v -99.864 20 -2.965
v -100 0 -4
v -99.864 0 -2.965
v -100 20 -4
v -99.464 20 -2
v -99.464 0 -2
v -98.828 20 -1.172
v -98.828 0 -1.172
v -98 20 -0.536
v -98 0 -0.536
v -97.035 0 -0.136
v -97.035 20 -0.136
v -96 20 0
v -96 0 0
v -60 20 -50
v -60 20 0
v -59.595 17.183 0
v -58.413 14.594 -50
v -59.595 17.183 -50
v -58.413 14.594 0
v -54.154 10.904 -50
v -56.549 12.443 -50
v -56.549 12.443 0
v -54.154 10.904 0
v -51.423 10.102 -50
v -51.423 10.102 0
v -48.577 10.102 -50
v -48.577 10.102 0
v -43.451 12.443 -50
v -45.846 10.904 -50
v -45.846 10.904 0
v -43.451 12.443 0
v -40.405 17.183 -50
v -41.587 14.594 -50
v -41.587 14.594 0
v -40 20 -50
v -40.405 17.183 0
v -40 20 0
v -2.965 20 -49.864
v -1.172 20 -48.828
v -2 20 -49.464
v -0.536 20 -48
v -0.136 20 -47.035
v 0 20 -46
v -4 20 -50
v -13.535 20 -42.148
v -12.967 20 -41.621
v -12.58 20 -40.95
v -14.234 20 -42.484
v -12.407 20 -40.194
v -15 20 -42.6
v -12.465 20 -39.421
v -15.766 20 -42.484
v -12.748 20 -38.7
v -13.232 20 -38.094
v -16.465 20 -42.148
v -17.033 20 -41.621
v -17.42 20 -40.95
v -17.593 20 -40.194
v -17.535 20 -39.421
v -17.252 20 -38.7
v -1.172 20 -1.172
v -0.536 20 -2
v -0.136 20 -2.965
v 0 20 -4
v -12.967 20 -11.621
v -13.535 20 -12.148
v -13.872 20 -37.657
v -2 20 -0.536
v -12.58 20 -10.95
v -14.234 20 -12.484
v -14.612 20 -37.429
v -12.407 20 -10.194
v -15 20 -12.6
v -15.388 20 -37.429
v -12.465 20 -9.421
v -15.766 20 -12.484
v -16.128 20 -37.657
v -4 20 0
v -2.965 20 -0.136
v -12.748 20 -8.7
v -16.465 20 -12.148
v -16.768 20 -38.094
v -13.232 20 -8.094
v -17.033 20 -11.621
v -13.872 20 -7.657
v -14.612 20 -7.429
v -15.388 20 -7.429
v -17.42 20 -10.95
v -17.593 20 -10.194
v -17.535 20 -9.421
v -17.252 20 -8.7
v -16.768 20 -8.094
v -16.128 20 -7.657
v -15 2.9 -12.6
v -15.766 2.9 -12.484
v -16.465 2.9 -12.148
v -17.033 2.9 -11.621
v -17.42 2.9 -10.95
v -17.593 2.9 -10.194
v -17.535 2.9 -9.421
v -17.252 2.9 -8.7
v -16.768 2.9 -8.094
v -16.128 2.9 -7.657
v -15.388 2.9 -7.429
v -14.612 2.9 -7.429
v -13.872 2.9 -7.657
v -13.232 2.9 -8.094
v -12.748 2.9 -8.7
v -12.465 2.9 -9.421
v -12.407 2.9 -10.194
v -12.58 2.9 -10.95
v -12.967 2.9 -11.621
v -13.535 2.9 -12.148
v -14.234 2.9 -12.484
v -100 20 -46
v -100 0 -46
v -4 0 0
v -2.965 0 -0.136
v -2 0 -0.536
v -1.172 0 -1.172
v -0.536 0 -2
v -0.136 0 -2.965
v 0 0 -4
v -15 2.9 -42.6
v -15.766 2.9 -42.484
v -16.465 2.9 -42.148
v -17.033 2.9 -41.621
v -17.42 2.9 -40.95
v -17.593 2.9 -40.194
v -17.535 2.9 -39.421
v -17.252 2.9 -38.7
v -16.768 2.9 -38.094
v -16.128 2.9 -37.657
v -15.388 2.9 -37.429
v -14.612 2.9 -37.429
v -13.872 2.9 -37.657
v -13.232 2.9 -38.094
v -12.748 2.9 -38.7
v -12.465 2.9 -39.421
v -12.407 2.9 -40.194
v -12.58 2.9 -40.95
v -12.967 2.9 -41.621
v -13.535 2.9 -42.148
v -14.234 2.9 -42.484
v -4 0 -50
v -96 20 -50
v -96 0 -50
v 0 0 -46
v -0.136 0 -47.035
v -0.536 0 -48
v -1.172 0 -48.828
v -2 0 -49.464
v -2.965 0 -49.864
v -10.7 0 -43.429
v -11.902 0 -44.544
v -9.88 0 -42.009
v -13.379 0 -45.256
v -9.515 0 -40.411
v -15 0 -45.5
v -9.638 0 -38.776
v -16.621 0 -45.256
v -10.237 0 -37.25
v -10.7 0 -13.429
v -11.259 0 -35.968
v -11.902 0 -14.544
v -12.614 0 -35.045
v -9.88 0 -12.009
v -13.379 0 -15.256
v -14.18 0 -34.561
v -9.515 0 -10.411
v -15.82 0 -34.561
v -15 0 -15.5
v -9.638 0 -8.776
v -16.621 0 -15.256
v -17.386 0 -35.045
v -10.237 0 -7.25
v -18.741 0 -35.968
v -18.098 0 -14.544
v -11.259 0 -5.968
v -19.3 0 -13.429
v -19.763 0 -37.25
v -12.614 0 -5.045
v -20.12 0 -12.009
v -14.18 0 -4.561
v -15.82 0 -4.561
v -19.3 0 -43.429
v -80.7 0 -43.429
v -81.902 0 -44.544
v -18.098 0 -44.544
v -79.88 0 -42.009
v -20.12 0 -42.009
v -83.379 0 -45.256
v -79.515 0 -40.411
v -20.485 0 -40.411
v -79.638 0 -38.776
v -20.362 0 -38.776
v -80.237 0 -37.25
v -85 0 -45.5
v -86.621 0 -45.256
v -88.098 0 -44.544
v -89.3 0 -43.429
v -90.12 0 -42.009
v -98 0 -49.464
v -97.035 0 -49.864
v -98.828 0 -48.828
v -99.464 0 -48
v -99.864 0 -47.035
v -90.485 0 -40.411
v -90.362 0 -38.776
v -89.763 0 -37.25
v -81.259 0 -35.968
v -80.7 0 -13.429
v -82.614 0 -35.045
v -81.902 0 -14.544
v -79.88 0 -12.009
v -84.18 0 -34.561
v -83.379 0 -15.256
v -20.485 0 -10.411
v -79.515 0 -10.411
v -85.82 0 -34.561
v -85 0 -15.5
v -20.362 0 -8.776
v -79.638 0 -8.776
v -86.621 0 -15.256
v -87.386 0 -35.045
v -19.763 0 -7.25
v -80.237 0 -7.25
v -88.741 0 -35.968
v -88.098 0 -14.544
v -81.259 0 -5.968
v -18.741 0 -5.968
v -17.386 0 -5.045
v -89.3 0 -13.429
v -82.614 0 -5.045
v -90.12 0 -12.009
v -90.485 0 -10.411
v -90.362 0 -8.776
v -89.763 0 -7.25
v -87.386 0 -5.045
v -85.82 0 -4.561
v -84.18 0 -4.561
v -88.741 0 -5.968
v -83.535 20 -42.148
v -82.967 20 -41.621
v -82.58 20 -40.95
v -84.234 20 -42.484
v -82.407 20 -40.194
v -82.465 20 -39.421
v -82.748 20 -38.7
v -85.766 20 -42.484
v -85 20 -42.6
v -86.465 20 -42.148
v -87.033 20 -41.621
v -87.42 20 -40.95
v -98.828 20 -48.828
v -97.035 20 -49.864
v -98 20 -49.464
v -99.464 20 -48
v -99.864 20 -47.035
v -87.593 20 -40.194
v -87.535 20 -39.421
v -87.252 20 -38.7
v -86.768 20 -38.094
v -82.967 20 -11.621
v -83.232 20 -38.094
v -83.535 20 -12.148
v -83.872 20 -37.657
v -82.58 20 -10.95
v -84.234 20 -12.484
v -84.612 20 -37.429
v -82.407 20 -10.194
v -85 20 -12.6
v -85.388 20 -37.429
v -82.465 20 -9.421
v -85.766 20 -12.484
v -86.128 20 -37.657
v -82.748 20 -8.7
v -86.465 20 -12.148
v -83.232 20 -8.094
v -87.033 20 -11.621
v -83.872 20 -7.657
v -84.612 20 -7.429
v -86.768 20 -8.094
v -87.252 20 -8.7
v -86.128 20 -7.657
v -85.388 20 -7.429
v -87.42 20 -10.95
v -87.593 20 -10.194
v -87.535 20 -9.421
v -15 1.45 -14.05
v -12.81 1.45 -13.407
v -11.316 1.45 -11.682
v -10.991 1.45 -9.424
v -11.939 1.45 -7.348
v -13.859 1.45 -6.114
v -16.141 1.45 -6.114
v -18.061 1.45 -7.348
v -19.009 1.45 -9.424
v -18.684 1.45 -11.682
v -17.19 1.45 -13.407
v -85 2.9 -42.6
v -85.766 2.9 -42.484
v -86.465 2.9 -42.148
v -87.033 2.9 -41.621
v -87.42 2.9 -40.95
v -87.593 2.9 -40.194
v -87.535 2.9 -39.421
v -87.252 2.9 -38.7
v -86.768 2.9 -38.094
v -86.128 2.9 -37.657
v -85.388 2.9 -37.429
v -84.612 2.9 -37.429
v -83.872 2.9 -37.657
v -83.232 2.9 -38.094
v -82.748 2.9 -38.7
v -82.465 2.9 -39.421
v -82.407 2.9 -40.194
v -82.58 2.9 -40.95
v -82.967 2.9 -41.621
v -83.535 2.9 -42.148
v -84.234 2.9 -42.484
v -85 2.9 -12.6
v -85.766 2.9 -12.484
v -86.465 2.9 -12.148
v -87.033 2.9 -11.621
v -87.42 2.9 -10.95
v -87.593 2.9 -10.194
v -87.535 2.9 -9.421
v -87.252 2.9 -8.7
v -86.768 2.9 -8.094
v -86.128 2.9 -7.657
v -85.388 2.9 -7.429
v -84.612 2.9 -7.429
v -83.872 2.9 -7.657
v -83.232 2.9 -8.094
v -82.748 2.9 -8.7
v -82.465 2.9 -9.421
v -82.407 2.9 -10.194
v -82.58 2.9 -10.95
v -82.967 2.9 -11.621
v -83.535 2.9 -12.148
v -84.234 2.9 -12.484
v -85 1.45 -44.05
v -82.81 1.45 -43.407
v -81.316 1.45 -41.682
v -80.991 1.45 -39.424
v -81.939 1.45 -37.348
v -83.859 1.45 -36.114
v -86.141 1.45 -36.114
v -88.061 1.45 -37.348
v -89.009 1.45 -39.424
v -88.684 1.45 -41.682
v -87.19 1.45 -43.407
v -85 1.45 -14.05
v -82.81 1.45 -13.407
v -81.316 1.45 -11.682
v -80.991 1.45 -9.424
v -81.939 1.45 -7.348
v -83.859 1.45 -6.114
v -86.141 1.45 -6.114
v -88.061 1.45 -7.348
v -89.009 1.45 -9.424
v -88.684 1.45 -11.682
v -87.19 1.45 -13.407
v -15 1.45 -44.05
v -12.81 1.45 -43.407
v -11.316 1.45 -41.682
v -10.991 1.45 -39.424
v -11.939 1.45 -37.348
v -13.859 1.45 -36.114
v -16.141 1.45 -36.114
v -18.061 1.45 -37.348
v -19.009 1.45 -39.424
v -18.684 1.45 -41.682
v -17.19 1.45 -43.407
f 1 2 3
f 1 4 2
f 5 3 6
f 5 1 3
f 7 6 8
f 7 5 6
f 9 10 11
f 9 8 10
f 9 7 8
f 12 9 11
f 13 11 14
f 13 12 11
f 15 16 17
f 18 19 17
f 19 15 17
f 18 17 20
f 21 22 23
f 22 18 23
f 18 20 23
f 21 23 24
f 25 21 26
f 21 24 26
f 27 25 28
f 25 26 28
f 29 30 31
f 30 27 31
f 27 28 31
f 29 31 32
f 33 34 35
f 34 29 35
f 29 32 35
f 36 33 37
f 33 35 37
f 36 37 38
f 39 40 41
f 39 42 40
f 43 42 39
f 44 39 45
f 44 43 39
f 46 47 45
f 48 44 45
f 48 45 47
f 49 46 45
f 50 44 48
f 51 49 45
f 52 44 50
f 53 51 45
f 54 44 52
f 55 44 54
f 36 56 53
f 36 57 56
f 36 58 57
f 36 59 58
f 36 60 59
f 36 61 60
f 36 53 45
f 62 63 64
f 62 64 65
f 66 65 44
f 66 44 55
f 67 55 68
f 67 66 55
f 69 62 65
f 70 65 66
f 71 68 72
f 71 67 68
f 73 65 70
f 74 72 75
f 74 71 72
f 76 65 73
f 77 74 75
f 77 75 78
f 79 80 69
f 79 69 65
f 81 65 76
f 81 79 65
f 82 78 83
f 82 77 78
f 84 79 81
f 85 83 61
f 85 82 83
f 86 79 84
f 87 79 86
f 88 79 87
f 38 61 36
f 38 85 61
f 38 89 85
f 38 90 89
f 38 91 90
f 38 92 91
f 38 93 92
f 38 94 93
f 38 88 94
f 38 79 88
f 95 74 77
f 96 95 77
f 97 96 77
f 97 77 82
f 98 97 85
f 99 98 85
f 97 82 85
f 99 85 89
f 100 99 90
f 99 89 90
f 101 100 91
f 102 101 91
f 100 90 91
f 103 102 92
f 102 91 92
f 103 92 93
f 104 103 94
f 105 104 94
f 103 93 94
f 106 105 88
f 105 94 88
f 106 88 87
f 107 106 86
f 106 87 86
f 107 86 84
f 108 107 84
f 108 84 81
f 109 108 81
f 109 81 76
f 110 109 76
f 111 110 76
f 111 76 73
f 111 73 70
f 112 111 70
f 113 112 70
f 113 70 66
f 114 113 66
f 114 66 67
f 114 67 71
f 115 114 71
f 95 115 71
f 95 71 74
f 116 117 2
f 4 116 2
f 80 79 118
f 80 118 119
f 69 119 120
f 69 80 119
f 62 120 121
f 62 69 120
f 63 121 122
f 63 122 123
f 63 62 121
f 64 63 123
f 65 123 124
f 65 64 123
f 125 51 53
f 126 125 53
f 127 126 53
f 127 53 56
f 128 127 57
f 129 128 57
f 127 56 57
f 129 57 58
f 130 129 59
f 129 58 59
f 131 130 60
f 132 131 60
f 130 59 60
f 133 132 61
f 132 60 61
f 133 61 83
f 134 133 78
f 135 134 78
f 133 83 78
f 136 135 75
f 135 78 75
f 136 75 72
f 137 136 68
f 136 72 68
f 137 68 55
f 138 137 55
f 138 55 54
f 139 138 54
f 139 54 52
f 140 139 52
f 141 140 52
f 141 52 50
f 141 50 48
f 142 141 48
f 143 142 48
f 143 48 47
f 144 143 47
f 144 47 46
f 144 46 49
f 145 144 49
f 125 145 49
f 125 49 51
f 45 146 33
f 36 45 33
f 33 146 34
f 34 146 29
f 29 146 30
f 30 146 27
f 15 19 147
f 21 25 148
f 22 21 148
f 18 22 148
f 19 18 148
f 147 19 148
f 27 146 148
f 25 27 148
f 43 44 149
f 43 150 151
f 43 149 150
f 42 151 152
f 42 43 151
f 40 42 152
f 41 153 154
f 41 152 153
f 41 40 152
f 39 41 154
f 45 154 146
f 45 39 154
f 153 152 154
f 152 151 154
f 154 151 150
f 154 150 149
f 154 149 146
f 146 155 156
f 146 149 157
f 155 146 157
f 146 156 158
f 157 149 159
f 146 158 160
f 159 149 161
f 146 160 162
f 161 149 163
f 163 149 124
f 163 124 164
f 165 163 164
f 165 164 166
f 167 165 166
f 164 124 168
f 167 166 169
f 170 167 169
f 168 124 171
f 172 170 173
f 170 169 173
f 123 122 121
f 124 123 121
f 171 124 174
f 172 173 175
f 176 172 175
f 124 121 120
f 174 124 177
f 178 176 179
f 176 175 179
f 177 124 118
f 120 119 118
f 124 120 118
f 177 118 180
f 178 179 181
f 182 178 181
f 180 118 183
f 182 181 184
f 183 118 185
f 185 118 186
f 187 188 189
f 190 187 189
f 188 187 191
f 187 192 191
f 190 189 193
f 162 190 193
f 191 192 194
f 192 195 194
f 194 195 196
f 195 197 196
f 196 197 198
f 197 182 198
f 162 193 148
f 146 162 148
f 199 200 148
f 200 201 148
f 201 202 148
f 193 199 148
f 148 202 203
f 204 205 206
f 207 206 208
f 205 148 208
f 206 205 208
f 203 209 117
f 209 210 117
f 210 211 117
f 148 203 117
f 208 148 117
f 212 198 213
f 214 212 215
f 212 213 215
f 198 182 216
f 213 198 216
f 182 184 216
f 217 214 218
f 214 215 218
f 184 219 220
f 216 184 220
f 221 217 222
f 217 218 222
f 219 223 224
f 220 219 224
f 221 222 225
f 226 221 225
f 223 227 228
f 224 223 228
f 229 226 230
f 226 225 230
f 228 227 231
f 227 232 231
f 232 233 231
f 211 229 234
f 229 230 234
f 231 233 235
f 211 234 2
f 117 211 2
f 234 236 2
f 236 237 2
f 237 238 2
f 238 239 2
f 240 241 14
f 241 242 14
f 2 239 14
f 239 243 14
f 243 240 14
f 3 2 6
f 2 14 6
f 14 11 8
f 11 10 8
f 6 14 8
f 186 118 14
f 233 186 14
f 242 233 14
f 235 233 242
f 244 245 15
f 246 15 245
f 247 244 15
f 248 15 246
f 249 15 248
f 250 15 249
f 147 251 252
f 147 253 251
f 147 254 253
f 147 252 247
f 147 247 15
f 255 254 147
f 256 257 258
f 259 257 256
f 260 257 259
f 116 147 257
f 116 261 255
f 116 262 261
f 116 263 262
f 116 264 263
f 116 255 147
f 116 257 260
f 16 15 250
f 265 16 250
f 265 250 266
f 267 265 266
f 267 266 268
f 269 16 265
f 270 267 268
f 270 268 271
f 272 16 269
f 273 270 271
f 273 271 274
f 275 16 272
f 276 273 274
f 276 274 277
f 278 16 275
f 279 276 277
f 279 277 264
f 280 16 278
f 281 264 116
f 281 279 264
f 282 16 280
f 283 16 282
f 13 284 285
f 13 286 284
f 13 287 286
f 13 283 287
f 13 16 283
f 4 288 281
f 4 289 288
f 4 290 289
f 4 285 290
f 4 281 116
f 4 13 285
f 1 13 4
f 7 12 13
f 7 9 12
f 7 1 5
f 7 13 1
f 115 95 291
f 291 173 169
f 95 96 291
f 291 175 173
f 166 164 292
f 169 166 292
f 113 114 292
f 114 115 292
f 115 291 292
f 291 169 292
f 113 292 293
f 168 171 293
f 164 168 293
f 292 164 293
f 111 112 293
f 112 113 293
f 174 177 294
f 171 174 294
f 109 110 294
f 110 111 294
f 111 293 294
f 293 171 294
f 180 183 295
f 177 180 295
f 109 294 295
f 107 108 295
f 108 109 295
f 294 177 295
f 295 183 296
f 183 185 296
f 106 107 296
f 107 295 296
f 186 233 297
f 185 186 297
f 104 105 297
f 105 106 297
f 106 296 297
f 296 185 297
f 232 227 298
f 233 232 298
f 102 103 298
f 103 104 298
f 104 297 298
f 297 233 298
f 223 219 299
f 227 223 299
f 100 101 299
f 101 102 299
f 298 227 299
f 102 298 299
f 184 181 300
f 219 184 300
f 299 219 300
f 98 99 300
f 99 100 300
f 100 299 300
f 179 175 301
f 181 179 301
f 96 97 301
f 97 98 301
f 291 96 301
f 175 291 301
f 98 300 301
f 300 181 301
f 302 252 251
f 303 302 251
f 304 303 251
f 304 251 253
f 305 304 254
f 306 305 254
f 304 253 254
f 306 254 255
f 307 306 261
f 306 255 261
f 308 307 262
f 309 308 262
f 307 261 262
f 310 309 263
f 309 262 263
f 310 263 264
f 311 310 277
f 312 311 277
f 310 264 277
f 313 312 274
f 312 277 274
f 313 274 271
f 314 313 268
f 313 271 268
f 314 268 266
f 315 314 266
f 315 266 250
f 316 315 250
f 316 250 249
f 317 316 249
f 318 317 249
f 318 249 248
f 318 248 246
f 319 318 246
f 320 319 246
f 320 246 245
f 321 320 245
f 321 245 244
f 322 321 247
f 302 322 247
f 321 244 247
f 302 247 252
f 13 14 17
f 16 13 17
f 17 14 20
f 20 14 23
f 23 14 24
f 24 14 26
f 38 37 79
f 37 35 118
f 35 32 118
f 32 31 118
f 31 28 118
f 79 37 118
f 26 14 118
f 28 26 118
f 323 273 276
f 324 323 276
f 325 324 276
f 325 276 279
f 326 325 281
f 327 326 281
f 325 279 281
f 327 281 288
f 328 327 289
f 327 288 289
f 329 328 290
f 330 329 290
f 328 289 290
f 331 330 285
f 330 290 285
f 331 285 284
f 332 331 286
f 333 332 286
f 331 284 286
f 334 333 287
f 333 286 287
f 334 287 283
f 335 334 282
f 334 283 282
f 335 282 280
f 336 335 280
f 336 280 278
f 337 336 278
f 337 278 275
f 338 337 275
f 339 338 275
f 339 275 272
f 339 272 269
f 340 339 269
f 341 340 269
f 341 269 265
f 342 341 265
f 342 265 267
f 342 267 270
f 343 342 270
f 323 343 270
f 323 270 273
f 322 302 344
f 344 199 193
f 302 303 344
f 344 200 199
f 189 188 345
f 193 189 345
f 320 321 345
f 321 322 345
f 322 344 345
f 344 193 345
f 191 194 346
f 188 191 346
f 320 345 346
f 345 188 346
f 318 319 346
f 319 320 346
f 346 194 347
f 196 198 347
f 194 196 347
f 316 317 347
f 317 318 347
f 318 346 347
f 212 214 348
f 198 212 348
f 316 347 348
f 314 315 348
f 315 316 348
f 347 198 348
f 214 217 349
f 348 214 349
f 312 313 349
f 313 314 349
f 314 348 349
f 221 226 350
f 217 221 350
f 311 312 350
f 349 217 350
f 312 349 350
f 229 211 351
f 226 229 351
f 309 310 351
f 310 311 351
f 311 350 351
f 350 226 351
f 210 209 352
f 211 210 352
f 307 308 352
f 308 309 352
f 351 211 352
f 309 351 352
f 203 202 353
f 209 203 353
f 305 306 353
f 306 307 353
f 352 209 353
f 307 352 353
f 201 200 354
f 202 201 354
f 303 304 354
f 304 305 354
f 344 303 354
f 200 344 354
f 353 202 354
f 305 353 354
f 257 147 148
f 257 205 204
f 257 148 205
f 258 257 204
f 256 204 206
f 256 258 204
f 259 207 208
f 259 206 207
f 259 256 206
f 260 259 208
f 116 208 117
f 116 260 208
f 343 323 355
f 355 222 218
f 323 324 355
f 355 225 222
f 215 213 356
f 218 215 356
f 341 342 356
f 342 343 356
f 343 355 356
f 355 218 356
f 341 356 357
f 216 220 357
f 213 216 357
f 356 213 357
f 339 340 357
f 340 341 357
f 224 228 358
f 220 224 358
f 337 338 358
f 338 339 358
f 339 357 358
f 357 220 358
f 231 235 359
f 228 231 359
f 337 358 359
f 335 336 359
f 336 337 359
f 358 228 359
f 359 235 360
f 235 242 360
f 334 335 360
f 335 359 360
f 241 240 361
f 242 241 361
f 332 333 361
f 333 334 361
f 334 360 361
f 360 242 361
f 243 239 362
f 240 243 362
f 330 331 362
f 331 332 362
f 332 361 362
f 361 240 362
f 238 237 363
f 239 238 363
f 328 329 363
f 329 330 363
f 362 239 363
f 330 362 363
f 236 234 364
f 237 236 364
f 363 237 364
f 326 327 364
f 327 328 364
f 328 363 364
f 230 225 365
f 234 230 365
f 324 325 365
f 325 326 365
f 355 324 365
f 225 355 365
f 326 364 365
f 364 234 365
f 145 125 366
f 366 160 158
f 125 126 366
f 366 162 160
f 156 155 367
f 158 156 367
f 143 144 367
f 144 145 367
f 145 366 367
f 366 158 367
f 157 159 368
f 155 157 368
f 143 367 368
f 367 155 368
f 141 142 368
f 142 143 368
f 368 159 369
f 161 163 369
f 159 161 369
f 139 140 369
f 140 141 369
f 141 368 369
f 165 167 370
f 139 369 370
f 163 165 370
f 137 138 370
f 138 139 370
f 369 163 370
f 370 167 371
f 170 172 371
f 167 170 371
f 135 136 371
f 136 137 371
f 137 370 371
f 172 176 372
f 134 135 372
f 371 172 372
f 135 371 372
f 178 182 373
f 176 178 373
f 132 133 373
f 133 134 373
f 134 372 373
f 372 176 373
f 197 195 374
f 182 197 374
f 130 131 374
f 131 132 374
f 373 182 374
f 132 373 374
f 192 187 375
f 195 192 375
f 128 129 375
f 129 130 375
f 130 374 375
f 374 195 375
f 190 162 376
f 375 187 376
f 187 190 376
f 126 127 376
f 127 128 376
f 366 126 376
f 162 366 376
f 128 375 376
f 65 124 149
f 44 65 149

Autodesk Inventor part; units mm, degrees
ref_plane "YZ Plane" through (0, 0, 0) normal (1, 0, 0) x (0, 1, 0)
ref_plane "XZ Plane" through (0, 0, 0) normal (0, 1, 0) x (-1, 0, 0)
ref_plane "XY Plane" through (0, 0, 0) normal (0, 0, 1) x (1, 0, 0)
sketch "Skizze1" plane through (0, 0, 0) normal (0, 1, 0) x (-1, 0, 0)
  line L0 (0, 0) -> (0, -50)
  line L1 (0, -50) -> (100, -50)
  line L2 (100, -50) -> (100, 0)
  line L3 (100, 0) -> (0, 0)
  dimension "d0" = 50
  dimension "d1" = 100
extrude "Extrusion1" add sketch "Skizze1" along normal blind 20
fillet "Rundung1" radius 4 4 edges at (0, 10, 0) (0, 10, -50) (-100, 10, -50) (-100, 10, 0)
sketch "Skizze2" plane through (-96, 0, 0) normal (0, 0, 1) x (1, 0, 0)
  line L0 (0, 20) -> (0, 0) projected
  line L1 (0, 0) -> (46, 0)
  line L2 (0, 0) -> (92, 0) projected
  line L3 (46, 0) -> (46, 20)
  circle A0 centre (46, 20) radius 10
  point P0 (96, 0)
  dimension "d5" = 46
  dimension "d6" = 20
  dimension "d7" = 20
extrude "Extrusion2" cut sketch "Skizze2" against normal through all
sketch "Skizze3" plane through (0, 0, 0) normal (0, -1, 0) x (1, 0, 0)
  line L0 (0, 0) -> (0, -10)
  line L1 (0, -4) -> (0, -46) projected
  line L2 (0, -10) -> (-15, -10)
  line L3 (-15, -10) -> (-85, -10)
  line L4 (-85, -10) -> (-85, -40)
  line L5 (-85, -40) -> (-15, -40)
  dimension "d10" = 10
  dimension "d11" = 15
  dimension "d12" = 70
  dimension "d13" = 30
hole "Bohrung1" at (-85, 0, -40) at (-85, 0, -10) at (-15, 0, -40) at (-15, 0, -10) direction (0, 1, 0) diameter 5.2 end through all countersink diameter 11 countersink angle 90
equation "\"d0\" = breite"
equation "\"d1\" = länge"
equation "\"d4\" = radius"
equation "\"d7\" = durchmesser"
equation "\"breite\" = 50"
equation "\"länge\" = 100"
equation "\"radius\" = 4"
equation "\"durchmesser\" = 20"
properties part number "TrittOT" material "PVC, hart"
